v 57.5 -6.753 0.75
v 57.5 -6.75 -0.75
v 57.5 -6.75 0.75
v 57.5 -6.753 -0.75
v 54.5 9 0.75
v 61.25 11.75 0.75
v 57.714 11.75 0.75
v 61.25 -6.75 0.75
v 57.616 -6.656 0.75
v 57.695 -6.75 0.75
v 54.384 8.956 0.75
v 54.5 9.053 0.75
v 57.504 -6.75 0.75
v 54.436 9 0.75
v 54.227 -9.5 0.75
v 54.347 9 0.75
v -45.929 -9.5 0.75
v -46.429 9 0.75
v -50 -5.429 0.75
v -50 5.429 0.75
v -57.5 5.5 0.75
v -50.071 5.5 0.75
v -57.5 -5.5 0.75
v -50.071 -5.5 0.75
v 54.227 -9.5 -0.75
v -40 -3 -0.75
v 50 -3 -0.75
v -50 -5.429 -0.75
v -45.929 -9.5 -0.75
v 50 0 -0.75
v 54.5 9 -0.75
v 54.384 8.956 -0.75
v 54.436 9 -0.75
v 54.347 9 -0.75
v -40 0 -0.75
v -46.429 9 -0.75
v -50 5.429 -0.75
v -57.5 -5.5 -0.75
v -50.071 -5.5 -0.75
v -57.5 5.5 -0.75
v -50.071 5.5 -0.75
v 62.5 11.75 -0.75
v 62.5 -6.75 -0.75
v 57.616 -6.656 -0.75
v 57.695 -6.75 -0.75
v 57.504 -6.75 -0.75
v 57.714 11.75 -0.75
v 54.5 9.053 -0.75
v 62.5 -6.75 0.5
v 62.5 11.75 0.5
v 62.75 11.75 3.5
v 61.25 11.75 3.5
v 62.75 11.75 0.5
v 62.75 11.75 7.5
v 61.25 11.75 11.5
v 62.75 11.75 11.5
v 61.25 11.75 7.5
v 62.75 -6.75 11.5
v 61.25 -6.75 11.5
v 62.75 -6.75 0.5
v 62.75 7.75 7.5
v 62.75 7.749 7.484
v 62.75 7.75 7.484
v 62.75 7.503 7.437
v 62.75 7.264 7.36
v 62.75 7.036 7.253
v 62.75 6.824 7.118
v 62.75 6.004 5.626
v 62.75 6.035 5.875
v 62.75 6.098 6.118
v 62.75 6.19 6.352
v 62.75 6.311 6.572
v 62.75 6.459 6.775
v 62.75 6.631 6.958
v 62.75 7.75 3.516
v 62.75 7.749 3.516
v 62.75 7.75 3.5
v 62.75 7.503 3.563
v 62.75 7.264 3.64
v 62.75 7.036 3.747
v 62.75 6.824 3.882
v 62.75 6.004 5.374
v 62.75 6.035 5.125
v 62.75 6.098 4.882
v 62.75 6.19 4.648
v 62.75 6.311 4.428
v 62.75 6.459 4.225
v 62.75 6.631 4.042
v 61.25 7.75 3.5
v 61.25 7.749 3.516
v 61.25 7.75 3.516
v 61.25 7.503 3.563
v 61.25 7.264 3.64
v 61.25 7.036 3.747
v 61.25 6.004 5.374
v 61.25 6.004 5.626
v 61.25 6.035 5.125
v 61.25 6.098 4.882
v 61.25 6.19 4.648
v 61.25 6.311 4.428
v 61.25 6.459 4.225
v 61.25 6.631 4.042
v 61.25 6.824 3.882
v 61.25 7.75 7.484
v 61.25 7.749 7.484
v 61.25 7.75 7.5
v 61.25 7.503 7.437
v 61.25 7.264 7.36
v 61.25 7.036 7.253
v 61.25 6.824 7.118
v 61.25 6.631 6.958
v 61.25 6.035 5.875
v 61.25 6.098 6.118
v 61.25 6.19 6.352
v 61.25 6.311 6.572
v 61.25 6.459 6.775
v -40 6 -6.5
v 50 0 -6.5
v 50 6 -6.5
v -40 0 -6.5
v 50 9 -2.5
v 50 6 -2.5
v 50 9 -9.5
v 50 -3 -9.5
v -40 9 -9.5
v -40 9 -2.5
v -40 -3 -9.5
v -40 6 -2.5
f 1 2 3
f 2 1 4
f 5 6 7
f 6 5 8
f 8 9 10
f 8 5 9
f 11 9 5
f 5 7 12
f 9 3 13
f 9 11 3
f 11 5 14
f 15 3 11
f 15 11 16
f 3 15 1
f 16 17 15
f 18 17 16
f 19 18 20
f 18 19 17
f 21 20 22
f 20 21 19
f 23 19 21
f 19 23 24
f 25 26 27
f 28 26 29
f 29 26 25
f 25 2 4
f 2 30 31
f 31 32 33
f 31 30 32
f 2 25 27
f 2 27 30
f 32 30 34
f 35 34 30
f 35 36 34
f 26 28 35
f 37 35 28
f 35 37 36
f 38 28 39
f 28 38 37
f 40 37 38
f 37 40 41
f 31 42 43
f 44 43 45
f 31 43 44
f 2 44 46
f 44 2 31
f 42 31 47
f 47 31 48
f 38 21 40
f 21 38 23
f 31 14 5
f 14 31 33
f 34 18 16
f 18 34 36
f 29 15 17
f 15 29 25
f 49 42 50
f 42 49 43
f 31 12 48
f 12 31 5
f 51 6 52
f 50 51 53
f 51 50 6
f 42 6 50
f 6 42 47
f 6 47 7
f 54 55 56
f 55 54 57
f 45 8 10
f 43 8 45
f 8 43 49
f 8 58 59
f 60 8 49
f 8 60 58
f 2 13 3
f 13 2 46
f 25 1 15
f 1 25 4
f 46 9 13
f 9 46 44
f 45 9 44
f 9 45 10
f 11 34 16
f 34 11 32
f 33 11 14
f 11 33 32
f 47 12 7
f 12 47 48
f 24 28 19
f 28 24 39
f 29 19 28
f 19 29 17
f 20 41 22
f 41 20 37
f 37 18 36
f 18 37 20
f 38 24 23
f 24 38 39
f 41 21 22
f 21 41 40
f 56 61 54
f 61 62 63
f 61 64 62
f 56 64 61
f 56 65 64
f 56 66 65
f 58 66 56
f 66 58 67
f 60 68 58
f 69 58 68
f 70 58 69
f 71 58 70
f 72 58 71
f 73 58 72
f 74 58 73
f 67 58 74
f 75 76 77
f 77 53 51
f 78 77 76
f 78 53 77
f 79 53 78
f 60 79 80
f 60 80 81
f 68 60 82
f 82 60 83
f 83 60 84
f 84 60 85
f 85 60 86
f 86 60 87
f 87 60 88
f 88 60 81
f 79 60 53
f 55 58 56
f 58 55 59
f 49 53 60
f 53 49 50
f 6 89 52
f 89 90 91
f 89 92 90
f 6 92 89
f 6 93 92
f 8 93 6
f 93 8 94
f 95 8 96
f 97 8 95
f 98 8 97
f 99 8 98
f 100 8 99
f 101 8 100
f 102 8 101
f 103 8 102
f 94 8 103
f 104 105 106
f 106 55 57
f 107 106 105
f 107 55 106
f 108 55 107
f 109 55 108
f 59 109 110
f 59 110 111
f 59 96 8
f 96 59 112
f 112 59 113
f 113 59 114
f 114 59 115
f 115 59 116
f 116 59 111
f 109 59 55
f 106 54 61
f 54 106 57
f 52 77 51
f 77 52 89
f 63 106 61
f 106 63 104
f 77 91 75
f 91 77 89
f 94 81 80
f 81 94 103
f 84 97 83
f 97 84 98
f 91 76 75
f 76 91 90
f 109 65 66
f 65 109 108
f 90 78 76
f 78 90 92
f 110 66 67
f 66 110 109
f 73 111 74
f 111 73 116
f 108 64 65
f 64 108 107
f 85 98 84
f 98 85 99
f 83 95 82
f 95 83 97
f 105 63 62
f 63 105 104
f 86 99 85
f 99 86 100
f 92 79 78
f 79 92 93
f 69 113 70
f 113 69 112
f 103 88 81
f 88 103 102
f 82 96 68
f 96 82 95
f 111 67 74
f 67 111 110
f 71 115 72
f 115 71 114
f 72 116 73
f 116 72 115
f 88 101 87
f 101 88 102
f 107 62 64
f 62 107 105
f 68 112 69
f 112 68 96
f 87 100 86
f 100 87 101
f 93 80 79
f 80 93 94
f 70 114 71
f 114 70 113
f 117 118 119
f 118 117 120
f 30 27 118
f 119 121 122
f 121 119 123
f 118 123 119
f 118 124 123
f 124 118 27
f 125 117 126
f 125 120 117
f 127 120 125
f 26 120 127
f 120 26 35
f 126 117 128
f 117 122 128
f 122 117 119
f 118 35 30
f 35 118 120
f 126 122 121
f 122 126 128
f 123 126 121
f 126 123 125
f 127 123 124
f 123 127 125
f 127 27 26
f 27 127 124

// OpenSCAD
thickness=1.5;

module pci_bracket() {
union() {
difference() {
union () {
translate([0,-0.25,0]) cube([115,18.5,thickness],center=true);
translate([58.5,2.5,0]) cube([8,18.5,thickness],center=true);
}
translate([57,-13.7,0]) rotate([0,0,40]) cube([10,10,10],center=true);
translate([55,16,0]) rotate([0,0,40]) cube([10,10,10],center=true);
translate([-50,-12.5,0]) rotate([0,0,45]) cube([10,10,10],center=true);
translate([-50,12.5,0]) rotate([0,0,45]) cube([10,10,10],center=true);
translate([-55,-10.5,0]) cube([10,10,10],center=true);
translate([-55,10.5,0]) cube([10,10,10],center=true);
}
difference() {
translate([62,2.5,6]) cube([thickness,18.5,11],center=true);
translate([62,10.75,5.5]) cube([2,6,4],center=true);
translate([62,8,5.5]) rotate([0,90,0]) cylinder(r=2,h=2,center=true);
}
}
}

pci_bracket();
rotate([0,90,0]){
translate([-0.5, -3, -40]){
    difference(){
    cube([10,12,90]);
        translate([1,3,0]){
            cube([6,6,90]);
            cube([2,9,90]);
        }
    }
}
}

$fn=50;
